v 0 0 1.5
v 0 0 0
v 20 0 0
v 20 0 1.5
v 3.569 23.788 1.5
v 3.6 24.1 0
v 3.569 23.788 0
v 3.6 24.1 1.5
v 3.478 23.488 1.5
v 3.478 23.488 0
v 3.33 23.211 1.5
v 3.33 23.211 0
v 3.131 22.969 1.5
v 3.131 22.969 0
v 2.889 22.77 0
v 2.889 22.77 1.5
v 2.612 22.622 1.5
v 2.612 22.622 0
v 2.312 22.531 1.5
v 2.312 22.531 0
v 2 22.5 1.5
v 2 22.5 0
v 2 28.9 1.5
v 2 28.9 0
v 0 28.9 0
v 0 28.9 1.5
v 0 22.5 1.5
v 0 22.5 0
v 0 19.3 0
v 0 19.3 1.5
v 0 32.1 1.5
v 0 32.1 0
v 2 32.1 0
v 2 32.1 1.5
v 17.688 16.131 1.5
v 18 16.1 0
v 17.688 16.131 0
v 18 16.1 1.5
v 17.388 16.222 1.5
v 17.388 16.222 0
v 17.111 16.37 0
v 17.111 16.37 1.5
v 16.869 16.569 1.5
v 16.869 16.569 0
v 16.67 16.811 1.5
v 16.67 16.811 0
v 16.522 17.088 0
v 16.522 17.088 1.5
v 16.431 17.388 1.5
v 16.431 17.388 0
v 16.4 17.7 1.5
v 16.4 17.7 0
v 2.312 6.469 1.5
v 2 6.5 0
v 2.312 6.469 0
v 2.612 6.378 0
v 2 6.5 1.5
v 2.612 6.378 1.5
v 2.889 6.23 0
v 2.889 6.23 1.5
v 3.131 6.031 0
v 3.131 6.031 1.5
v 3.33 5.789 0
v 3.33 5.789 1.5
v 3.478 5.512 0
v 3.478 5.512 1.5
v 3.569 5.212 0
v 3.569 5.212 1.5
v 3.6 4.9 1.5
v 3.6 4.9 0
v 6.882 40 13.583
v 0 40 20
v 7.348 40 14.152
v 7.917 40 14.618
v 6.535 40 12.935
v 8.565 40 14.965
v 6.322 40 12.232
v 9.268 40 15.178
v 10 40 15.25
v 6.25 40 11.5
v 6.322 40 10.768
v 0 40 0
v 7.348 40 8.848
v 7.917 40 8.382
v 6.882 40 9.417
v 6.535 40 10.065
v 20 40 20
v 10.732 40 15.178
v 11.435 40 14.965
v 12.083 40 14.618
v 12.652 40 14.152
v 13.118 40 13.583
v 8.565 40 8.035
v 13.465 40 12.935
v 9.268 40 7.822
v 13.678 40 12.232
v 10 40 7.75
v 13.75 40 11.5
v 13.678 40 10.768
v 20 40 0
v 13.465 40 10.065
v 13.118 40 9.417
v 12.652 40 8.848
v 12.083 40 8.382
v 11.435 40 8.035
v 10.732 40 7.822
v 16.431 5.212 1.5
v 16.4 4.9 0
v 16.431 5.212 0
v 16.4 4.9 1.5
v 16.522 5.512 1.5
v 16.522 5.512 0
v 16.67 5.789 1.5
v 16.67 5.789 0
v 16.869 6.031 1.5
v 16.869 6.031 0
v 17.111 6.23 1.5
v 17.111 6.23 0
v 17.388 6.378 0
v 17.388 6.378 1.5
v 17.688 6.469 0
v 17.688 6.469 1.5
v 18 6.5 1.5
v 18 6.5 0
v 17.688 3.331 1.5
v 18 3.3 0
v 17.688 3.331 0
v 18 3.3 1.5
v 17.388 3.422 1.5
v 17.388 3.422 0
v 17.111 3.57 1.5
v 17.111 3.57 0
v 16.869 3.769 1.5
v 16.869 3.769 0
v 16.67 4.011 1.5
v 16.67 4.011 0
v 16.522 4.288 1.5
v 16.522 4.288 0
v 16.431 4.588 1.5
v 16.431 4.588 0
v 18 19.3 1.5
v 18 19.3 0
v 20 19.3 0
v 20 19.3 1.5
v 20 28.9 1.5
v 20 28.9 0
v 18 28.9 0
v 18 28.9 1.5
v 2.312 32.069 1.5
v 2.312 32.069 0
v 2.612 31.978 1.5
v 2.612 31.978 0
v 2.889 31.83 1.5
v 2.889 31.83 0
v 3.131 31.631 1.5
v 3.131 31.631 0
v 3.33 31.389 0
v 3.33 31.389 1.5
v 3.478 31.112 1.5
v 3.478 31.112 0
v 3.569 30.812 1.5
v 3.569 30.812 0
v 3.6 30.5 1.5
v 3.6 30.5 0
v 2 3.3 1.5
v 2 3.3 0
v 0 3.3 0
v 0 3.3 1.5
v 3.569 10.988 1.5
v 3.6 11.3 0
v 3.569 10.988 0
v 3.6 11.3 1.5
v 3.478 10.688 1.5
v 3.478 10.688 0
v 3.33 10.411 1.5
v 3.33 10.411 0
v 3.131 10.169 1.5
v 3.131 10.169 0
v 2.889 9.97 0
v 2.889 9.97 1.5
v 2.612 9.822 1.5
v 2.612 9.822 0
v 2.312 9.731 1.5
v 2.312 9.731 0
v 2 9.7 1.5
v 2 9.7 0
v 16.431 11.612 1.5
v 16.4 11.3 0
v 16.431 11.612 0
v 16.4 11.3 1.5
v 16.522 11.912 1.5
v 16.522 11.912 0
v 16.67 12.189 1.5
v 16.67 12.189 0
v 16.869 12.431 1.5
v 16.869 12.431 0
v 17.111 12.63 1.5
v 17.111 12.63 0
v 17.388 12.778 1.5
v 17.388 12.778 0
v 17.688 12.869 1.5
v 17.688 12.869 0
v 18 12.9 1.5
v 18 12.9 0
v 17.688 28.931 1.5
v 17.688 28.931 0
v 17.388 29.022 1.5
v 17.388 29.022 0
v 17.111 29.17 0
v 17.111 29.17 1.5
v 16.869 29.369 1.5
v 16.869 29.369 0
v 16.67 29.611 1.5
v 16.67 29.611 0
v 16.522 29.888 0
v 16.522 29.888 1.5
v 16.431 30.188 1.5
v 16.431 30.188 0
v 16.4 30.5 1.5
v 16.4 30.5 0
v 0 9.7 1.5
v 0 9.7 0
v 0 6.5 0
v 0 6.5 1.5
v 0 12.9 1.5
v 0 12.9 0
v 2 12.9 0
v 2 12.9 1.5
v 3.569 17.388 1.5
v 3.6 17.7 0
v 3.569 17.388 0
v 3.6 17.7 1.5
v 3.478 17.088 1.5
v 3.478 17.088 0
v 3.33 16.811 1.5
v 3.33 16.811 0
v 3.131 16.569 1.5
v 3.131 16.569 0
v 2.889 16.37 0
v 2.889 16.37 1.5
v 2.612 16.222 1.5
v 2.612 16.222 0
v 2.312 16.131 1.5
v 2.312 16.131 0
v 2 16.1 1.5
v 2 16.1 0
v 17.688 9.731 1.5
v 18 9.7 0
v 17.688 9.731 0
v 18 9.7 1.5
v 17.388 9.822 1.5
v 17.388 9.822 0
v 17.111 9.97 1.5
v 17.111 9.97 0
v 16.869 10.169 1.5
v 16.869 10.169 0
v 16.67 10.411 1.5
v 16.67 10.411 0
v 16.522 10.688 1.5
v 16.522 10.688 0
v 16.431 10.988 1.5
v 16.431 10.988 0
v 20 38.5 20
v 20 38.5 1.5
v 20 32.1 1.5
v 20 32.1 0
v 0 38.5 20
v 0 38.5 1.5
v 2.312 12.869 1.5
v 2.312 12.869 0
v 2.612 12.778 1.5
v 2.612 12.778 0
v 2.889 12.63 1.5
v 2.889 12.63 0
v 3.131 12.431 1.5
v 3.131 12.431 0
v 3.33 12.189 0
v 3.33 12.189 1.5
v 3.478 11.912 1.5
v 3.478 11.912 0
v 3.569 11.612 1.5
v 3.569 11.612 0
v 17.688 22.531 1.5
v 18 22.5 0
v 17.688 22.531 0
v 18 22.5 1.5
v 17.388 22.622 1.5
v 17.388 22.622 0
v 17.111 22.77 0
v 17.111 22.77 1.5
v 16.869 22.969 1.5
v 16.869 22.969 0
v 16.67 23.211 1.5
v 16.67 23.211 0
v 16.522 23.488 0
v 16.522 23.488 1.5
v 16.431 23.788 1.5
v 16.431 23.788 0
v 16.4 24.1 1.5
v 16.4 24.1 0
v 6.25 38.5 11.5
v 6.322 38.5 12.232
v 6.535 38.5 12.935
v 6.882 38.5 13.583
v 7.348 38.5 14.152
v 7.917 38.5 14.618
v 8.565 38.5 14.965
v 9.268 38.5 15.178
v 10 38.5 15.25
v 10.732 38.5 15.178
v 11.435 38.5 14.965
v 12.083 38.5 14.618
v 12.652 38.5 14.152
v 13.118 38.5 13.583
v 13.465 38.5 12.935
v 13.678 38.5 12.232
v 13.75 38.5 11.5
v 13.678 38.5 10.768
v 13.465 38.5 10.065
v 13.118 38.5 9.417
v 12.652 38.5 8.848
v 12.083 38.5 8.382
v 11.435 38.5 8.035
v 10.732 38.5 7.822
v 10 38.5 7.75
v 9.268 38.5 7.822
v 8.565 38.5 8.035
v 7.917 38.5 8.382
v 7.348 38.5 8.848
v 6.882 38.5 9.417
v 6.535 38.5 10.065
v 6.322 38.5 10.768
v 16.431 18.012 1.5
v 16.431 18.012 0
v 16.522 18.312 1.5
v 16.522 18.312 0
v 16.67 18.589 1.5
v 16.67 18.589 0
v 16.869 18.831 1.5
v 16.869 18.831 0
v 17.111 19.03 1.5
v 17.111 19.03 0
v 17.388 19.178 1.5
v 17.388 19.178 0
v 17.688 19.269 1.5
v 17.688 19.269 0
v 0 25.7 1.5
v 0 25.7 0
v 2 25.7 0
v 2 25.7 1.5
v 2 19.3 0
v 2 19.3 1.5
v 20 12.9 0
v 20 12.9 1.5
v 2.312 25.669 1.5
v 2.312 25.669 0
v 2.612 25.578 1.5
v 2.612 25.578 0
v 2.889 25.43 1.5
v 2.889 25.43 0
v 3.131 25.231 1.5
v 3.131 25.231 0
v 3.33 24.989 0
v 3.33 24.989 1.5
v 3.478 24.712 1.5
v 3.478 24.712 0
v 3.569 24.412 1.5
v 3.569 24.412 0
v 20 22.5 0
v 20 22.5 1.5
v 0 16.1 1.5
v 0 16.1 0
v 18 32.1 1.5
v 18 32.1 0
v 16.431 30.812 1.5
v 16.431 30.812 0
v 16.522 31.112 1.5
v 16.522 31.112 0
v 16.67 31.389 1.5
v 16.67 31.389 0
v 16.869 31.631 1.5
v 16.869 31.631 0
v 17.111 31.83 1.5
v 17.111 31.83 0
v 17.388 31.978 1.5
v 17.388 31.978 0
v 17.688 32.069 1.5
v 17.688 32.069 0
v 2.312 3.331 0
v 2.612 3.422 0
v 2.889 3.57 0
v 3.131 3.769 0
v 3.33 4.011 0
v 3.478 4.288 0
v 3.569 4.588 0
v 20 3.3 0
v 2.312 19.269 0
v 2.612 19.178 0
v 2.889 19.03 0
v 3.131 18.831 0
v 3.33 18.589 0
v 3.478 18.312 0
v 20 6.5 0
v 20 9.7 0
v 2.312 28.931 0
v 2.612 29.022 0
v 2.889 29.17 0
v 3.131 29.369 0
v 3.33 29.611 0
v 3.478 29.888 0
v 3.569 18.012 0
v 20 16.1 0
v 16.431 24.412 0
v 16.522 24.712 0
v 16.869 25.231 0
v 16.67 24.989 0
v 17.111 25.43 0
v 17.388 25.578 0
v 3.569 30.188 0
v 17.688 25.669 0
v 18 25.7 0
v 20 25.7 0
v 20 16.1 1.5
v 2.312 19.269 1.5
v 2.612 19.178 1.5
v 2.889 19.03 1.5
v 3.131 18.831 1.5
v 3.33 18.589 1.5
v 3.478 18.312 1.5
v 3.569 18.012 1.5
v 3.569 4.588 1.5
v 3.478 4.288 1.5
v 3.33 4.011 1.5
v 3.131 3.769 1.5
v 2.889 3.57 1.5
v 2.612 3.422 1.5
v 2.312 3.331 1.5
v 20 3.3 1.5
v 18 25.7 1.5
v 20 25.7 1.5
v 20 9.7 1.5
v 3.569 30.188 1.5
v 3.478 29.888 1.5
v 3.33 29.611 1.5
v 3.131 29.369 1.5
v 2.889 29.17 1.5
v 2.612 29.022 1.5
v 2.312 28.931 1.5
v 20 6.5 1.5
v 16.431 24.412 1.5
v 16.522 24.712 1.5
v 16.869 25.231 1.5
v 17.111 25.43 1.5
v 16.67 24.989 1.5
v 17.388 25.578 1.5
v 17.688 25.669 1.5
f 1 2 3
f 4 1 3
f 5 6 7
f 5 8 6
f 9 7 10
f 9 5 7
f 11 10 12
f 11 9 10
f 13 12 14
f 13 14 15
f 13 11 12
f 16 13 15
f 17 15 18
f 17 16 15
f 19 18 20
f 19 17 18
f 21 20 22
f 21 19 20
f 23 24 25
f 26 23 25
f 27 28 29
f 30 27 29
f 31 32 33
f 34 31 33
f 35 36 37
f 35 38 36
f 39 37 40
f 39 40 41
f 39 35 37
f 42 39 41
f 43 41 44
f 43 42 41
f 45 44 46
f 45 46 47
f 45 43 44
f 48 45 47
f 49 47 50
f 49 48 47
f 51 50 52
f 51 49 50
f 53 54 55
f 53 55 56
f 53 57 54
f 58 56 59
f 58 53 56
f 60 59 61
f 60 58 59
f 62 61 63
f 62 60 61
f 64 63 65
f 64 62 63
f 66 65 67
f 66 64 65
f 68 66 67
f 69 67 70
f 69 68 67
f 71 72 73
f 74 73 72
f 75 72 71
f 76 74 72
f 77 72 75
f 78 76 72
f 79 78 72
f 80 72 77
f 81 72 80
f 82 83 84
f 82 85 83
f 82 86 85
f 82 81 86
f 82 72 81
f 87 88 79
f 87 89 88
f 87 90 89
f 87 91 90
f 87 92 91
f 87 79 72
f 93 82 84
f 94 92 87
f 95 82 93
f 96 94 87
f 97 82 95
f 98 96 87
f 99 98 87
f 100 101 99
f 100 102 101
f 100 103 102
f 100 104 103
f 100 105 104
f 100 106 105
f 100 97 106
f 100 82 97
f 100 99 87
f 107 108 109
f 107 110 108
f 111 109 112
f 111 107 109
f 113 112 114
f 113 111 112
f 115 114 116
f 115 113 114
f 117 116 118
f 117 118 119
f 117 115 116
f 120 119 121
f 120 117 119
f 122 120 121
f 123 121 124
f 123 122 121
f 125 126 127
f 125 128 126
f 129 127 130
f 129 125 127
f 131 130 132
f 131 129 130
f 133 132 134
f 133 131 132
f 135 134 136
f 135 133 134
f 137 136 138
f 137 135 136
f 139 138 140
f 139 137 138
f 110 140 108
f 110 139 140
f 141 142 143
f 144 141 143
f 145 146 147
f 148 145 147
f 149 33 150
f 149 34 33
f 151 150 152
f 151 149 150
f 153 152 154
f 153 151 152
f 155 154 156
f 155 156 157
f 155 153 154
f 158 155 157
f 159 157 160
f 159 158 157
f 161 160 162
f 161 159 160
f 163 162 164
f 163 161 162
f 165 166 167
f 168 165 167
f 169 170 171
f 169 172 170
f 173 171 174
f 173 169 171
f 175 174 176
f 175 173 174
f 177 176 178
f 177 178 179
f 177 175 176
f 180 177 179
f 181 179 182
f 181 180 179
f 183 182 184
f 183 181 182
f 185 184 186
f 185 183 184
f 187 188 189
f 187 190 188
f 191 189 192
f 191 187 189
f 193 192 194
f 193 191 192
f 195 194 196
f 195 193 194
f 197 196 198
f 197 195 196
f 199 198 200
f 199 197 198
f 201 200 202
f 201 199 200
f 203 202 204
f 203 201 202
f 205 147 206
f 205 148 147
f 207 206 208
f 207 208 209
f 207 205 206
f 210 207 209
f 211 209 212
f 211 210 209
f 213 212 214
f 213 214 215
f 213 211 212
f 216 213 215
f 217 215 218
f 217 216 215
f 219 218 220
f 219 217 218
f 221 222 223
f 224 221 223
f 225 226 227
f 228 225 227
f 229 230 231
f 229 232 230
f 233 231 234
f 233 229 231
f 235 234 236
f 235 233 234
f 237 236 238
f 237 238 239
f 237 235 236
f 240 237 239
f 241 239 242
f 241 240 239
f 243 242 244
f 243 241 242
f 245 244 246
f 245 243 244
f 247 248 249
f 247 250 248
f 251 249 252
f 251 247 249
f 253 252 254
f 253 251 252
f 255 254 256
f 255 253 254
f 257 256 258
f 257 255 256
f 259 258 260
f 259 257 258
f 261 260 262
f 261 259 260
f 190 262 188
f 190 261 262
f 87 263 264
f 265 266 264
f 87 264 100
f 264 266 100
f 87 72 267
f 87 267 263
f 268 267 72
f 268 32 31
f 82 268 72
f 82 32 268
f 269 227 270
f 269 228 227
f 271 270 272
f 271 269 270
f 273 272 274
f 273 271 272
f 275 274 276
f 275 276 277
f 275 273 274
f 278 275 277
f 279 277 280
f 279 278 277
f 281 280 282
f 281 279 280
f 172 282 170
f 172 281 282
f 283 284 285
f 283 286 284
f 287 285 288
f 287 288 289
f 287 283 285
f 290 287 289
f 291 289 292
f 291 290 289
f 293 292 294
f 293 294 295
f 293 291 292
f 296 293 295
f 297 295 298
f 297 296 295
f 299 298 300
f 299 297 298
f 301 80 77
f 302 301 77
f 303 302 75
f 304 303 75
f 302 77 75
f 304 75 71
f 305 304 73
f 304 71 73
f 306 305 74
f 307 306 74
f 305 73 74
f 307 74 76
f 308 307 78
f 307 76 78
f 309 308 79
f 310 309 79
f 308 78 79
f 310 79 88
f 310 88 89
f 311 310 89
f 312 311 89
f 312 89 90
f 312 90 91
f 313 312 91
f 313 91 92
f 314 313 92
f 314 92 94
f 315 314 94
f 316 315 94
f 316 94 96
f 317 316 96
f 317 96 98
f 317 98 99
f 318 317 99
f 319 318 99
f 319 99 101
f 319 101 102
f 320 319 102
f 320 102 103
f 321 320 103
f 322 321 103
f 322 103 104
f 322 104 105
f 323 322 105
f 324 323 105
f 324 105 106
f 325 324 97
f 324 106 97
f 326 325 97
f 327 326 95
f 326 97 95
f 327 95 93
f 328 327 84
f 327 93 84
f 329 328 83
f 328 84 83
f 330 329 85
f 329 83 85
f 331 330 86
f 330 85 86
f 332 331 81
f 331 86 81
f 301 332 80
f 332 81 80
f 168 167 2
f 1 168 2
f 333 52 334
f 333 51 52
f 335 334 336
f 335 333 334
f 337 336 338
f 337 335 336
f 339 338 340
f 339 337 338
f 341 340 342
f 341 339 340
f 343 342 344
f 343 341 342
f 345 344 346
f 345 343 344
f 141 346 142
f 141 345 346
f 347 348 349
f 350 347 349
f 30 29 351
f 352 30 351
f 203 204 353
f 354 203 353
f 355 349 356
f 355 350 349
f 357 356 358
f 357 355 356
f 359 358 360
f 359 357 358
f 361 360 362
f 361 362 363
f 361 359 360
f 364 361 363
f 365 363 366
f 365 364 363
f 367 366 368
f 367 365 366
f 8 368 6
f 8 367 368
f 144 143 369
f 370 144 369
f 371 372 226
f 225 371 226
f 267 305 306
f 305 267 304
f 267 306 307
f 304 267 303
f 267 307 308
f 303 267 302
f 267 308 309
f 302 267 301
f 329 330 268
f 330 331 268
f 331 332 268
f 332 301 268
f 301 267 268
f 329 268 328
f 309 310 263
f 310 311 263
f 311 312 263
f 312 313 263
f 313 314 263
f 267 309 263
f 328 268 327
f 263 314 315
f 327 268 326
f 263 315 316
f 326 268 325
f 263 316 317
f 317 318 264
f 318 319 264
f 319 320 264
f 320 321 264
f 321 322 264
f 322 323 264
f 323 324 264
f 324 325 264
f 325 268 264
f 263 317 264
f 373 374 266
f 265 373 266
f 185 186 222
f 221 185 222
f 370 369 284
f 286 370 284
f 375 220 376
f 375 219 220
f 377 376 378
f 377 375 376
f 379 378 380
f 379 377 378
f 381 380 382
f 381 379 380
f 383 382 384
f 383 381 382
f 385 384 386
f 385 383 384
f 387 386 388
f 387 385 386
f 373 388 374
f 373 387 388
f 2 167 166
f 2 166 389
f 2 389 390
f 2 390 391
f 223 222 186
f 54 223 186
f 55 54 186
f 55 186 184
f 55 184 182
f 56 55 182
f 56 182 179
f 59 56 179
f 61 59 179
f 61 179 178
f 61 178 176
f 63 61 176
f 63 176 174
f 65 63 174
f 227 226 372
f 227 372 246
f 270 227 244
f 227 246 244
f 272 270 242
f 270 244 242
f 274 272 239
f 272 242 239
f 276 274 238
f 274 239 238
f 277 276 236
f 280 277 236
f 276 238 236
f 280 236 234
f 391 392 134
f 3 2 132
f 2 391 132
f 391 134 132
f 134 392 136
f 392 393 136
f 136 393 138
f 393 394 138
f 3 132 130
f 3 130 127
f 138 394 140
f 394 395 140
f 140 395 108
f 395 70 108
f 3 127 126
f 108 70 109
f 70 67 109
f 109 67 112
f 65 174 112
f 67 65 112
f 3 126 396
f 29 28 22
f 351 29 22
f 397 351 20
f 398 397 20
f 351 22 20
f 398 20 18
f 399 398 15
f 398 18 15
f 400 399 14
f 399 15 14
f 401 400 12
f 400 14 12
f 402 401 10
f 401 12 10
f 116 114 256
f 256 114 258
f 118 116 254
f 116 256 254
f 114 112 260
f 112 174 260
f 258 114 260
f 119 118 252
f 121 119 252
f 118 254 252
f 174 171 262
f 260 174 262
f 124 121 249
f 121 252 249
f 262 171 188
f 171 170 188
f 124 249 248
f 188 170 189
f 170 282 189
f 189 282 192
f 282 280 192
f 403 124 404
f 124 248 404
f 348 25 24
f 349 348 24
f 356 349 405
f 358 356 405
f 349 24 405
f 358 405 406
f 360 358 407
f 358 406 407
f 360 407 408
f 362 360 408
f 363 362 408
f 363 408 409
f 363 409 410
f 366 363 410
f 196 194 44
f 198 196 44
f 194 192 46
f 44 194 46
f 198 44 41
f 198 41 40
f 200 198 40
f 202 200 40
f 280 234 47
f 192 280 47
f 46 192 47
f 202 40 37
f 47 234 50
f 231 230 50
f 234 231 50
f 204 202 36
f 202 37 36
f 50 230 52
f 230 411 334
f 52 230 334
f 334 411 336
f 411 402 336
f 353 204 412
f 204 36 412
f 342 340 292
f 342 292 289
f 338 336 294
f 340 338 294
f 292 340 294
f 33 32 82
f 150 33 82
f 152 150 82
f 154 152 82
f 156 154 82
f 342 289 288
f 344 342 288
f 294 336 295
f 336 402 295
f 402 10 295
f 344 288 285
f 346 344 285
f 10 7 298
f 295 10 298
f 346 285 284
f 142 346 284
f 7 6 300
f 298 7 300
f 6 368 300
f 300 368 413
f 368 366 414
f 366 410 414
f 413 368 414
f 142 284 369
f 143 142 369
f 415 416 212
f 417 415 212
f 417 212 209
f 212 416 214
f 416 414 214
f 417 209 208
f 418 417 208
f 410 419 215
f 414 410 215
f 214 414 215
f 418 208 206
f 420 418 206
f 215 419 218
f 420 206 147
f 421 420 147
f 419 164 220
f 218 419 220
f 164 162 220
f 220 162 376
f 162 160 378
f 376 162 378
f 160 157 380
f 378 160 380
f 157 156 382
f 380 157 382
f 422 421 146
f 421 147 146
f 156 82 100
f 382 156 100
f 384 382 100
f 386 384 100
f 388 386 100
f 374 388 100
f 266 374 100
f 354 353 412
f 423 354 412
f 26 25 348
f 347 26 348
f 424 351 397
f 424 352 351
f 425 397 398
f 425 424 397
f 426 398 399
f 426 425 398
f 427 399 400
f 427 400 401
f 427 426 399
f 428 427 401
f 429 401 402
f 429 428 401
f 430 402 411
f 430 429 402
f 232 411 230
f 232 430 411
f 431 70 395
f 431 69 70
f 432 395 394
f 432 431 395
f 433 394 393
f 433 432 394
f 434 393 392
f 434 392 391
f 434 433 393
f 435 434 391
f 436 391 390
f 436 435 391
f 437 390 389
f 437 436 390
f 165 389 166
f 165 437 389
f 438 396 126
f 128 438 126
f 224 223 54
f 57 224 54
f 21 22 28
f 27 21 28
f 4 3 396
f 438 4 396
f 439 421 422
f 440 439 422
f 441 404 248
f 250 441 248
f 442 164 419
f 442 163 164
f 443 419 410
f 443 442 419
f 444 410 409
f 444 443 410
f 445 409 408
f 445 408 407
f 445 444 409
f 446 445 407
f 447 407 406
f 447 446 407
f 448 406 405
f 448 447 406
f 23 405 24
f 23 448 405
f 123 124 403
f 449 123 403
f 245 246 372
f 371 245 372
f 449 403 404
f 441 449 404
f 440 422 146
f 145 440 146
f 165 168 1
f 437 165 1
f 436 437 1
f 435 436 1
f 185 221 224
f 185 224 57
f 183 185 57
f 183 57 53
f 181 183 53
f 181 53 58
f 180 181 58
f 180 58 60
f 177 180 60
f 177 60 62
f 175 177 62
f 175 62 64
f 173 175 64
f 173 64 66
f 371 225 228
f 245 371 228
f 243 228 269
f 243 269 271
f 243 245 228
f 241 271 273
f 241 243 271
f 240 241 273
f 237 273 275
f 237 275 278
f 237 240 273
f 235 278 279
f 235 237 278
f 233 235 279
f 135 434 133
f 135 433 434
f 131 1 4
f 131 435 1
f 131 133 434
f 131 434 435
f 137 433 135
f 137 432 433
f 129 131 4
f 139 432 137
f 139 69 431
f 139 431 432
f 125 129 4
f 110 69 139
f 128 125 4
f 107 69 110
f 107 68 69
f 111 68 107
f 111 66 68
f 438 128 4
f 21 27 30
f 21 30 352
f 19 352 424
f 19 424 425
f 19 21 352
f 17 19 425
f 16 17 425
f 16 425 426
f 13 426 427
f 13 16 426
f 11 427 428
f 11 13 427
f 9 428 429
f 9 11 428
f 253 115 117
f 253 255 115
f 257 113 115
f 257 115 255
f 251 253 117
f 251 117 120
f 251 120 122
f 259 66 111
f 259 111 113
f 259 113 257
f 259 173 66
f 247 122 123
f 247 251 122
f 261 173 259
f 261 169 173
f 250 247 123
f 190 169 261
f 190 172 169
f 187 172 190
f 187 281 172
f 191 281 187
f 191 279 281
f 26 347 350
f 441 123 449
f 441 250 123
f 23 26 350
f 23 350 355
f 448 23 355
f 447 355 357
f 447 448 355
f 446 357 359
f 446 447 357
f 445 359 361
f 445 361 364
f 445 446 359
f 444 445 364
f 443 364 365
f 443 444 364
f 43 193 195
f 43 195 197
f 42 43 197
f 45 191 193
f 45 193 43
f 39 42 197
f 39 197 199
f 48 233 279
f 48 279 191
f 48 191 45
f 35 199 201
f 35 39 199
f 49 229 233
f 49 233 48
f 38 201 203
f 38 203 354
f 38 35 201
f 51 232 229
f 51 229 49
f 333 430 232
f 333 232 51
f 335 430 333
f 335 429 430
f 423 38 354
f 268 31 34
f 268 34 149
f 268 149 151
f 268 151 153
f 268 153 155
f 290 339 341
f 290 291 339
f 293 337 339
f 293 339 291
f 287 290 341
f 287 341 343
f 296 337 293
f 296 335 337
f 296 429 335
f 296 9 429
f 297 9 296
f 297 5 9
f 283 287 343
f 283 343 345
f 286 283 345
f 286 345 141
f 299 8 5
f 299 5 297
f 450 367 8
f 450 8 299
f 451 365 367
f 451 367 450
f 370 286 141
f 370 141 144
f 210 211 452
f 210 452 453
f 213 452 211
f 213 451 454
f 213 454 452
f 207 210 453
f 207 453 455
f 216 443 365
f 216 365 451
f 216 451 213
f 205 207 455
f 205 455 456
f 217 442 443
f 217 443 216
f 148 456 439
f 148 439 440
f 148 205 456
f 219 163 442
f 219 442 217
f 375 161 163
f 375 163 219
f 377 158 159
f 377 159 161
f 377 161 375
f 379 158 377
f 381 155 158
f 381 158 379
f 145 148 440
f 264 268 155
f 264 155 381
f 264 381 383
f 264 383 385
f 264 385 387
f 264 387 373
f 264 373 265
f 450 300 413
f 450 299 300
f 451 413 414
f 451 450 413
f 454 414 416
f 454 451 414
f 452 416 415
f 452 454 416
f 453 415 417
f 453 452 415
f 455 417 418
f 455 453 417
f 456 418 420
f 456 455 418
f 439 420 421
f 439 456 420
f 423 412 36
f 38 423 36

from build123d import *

# Parameters (mm, degrees)
F1_DEPTH = 1.5
F0_W     = 20
F0_H     = 1.5
F2_DEPTH = 20
F3_R     = 3.75
F4_DEPTH = 25
F5_R     = 1.59999


# Not quite as in the source:
# - a fillet or chamfer is up to 0.001 mm smaller than in the source, because OpenCascade refuses the exact size


with BuildPart() as f1:
    # F0 (on Top) → F1 (new body)
    with BuildSketch(Plane.XY):
        Polygon((0, 3.3), (0, 0), (20, 0), (20, 3.3), (16.4, 3.3), (16.4, 6.5), (20, 6.5), (20, 9.7), (16.4, 9.7), (16.4, 12.9), (20, 12.9), (20, 16.1), (16.4, 16.1), (16.4, 19.3), (20, 19.3), (20, 22.5), (16.4, 22.5), (16.4, 25.7), (20, 25.7), (20, 28.9), (16.4, 28.9), (16.4, 32.1), (20, 32.1), (20, 38.5), (0, 38.5), (0, 32.1), (3.6, 32.1), (3.6, 28.9), (0, 28.9), (0, 25.7), (3.6, 25.7), (3.6, 22.5), (0, 22.5), (0, 19.3), (3.6, 19.3), (3.6, 16.1), (0, 16.1), (0, 12.9), (3.6, 12.9), (3.6, 9.7), (0, 9.7), (0, 6.5), (3.6, 6.5), (3.6, 3.3), align=None)
    extrude(amount=F1_DEPTH)

    # F0 (on Top) → F2 (join)
    with BuildSketch(Plane.XY):
        with Locations((10, 39.25)):
            Rectangle(F0_W, F0_H)
    extrude(amount=F2_DEPTH)

    # F3 (on face) → F4 (cut)
    with BuildSketch(Plane(origin=(0, 40, 0), x_dir=(-1, 0, 0), z_dir=(0, 1, 0))):
        with Locations((-10, 11.5)):
            Circle(F3_R)
    extrude(amount=-F4_DEPTH, mode=Mode.SUBTRACT)

    # F5 (radius 1.6 in the source; OpenCascade refuses exactly that, so slightly less here)
    f5_edges = [f1.edges().sort_by_distance(p)[0] for p in [
        (16.4, 32.1, 0.75),
        (16.4, 28.9, 0.75),
        (16.4, 25.7, 0.75),
        (16.4, 22.5, 0.75),
        (16.4, 16.1, 0.75),
        (16.4, 9.7, 0.75),
        (16.4, 3.3, 0.75),
        (16.4, 19.3, 0.75),
        (16.4, 12.9, 0.75),
        (16.4, 6.5, 0.75),
        (3.6, 32.1, 0.75),
        (3.6, 25.7, 0.75),
        (3.6, 19.3, 0.75),
        (3.6, 12.9, 0.75),
        (3.6, 6.5, 0.75),
        (3.6, 28.9, 0.75),
        (3.6, 22.5, 0.75),
        (3.6, 16.1, 0.75),
        (3.6, 9.7, 0.75),
        (3.6, 3.3, 0.75),
    ]]
    fillet(f5_edges, radius=F5_R)


solid = f1.part
